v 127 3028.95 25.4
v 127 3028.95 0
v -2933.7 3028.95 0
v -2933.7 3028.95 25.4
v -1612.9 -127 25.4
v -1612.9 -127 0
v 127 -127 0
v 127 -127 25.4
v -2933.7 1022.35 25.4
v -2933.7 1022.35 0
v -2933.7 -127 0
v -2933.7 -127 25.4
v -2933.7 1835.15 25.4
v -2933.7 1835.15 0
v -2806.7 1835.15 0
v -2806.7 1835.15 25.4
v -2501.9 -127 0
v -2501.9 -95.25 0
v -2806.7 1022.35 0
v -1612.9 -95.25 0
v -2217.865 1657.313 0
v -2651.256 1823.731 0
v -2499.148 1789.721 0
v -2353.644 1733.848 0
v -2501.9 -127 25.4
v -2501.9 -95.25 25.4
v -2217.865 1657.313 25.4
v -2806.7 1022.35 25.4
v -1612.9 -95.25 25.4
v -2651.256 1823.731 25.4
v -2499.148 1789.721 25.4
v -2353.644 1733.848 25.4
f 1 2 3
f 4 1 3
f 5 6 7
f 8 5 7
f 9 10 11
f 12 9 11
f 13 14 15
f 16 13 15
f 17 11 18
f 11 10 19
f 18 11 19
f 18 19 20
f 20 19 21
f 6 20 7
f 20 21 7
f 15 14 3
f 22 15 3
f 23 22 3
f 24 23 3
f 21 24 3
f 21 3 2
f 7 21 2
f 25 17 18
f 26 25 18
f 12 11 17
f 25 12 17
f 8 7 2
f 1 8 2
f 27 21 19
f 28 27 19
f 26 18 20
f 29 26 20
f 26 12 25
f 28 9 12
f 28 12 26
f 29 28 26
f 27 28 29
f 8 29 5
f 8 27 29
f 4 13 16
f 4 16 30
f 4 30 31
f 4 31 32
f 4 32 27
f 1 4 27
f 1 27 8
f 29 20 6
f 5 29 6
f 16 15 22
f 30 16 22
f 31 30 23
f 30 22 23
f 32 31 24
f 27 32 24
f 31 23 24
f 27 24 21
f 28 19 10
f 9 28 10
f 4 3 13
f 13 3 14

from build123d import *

# Parameters (mm, degrees)
F1_DEPTH = 25.4


with BuildPart() as f1:
    # F0 (on Top) → F1 (new body)
    with BuildSketch(Plane.XY):
        Polygon((-2806.7, 1835.15), (-2806.7, 2901.95), (0, 2901.95), (0, 0), (-1181.1, 0), (-1181.1, 990.6), (-1308.1, 990.6), (-1308.1, 0), (-1612.9, 0), (-1612.9, -31.75), (-2501.9, -31.75), (-2501.9, 0), (-2806.7, 0), (-2806.7, 1022.35), (-2933.7, 1022.35), (-2933.7, -127), (-2501.9, -127), (-2501.9, -95.25), (-1612.9, -95.25), (-1612.9, -127), (127, -127), (127, 3028.95), (-2933.7, 3028.95), (-2933.7, 1835.15), align=None)
        with BuildLine():
            Line((0, 2901.95), (-2806.7, 2901.95))
            Line((-2806.7, 2901.95), (-2806.7, 1835.15))
            ThreePointArc((-2806.7, 1835.15), (-2499.148315, 1789.72079), (-2217.865313, 1657.31337))
            Line((-2217.865313, 1657.31337), (-2806.7, 1022.35))
            Line((-2806.7, 1022.35), (-2806.7, 0))
            Line((-2806.7, 0), (-2501.9, 0))
            Line((-2501.9, 0), (-2501.9, -31.75))
            Line((-2501.9, -31.75), (-1612.9, -31.75))
            Line((-1612.9, -31.75), (-1612.9, 0))
            Line((-1612.9, 0), (-1308.1, 0))
            Line((-1308.1, 0), (-1308.1, 990.6))
            Line((-1308.1, 990.6), (-1181.1, 990.6))
            Line((-1181.1, 990.6), (-1181.1, 0))
            Line((-1181.1, 0), (0, 0))
            Line((0, 0), (0, 2901.95))
        make_face()
    extrude(amount=F1_DEPTH)


solid = f1.part
